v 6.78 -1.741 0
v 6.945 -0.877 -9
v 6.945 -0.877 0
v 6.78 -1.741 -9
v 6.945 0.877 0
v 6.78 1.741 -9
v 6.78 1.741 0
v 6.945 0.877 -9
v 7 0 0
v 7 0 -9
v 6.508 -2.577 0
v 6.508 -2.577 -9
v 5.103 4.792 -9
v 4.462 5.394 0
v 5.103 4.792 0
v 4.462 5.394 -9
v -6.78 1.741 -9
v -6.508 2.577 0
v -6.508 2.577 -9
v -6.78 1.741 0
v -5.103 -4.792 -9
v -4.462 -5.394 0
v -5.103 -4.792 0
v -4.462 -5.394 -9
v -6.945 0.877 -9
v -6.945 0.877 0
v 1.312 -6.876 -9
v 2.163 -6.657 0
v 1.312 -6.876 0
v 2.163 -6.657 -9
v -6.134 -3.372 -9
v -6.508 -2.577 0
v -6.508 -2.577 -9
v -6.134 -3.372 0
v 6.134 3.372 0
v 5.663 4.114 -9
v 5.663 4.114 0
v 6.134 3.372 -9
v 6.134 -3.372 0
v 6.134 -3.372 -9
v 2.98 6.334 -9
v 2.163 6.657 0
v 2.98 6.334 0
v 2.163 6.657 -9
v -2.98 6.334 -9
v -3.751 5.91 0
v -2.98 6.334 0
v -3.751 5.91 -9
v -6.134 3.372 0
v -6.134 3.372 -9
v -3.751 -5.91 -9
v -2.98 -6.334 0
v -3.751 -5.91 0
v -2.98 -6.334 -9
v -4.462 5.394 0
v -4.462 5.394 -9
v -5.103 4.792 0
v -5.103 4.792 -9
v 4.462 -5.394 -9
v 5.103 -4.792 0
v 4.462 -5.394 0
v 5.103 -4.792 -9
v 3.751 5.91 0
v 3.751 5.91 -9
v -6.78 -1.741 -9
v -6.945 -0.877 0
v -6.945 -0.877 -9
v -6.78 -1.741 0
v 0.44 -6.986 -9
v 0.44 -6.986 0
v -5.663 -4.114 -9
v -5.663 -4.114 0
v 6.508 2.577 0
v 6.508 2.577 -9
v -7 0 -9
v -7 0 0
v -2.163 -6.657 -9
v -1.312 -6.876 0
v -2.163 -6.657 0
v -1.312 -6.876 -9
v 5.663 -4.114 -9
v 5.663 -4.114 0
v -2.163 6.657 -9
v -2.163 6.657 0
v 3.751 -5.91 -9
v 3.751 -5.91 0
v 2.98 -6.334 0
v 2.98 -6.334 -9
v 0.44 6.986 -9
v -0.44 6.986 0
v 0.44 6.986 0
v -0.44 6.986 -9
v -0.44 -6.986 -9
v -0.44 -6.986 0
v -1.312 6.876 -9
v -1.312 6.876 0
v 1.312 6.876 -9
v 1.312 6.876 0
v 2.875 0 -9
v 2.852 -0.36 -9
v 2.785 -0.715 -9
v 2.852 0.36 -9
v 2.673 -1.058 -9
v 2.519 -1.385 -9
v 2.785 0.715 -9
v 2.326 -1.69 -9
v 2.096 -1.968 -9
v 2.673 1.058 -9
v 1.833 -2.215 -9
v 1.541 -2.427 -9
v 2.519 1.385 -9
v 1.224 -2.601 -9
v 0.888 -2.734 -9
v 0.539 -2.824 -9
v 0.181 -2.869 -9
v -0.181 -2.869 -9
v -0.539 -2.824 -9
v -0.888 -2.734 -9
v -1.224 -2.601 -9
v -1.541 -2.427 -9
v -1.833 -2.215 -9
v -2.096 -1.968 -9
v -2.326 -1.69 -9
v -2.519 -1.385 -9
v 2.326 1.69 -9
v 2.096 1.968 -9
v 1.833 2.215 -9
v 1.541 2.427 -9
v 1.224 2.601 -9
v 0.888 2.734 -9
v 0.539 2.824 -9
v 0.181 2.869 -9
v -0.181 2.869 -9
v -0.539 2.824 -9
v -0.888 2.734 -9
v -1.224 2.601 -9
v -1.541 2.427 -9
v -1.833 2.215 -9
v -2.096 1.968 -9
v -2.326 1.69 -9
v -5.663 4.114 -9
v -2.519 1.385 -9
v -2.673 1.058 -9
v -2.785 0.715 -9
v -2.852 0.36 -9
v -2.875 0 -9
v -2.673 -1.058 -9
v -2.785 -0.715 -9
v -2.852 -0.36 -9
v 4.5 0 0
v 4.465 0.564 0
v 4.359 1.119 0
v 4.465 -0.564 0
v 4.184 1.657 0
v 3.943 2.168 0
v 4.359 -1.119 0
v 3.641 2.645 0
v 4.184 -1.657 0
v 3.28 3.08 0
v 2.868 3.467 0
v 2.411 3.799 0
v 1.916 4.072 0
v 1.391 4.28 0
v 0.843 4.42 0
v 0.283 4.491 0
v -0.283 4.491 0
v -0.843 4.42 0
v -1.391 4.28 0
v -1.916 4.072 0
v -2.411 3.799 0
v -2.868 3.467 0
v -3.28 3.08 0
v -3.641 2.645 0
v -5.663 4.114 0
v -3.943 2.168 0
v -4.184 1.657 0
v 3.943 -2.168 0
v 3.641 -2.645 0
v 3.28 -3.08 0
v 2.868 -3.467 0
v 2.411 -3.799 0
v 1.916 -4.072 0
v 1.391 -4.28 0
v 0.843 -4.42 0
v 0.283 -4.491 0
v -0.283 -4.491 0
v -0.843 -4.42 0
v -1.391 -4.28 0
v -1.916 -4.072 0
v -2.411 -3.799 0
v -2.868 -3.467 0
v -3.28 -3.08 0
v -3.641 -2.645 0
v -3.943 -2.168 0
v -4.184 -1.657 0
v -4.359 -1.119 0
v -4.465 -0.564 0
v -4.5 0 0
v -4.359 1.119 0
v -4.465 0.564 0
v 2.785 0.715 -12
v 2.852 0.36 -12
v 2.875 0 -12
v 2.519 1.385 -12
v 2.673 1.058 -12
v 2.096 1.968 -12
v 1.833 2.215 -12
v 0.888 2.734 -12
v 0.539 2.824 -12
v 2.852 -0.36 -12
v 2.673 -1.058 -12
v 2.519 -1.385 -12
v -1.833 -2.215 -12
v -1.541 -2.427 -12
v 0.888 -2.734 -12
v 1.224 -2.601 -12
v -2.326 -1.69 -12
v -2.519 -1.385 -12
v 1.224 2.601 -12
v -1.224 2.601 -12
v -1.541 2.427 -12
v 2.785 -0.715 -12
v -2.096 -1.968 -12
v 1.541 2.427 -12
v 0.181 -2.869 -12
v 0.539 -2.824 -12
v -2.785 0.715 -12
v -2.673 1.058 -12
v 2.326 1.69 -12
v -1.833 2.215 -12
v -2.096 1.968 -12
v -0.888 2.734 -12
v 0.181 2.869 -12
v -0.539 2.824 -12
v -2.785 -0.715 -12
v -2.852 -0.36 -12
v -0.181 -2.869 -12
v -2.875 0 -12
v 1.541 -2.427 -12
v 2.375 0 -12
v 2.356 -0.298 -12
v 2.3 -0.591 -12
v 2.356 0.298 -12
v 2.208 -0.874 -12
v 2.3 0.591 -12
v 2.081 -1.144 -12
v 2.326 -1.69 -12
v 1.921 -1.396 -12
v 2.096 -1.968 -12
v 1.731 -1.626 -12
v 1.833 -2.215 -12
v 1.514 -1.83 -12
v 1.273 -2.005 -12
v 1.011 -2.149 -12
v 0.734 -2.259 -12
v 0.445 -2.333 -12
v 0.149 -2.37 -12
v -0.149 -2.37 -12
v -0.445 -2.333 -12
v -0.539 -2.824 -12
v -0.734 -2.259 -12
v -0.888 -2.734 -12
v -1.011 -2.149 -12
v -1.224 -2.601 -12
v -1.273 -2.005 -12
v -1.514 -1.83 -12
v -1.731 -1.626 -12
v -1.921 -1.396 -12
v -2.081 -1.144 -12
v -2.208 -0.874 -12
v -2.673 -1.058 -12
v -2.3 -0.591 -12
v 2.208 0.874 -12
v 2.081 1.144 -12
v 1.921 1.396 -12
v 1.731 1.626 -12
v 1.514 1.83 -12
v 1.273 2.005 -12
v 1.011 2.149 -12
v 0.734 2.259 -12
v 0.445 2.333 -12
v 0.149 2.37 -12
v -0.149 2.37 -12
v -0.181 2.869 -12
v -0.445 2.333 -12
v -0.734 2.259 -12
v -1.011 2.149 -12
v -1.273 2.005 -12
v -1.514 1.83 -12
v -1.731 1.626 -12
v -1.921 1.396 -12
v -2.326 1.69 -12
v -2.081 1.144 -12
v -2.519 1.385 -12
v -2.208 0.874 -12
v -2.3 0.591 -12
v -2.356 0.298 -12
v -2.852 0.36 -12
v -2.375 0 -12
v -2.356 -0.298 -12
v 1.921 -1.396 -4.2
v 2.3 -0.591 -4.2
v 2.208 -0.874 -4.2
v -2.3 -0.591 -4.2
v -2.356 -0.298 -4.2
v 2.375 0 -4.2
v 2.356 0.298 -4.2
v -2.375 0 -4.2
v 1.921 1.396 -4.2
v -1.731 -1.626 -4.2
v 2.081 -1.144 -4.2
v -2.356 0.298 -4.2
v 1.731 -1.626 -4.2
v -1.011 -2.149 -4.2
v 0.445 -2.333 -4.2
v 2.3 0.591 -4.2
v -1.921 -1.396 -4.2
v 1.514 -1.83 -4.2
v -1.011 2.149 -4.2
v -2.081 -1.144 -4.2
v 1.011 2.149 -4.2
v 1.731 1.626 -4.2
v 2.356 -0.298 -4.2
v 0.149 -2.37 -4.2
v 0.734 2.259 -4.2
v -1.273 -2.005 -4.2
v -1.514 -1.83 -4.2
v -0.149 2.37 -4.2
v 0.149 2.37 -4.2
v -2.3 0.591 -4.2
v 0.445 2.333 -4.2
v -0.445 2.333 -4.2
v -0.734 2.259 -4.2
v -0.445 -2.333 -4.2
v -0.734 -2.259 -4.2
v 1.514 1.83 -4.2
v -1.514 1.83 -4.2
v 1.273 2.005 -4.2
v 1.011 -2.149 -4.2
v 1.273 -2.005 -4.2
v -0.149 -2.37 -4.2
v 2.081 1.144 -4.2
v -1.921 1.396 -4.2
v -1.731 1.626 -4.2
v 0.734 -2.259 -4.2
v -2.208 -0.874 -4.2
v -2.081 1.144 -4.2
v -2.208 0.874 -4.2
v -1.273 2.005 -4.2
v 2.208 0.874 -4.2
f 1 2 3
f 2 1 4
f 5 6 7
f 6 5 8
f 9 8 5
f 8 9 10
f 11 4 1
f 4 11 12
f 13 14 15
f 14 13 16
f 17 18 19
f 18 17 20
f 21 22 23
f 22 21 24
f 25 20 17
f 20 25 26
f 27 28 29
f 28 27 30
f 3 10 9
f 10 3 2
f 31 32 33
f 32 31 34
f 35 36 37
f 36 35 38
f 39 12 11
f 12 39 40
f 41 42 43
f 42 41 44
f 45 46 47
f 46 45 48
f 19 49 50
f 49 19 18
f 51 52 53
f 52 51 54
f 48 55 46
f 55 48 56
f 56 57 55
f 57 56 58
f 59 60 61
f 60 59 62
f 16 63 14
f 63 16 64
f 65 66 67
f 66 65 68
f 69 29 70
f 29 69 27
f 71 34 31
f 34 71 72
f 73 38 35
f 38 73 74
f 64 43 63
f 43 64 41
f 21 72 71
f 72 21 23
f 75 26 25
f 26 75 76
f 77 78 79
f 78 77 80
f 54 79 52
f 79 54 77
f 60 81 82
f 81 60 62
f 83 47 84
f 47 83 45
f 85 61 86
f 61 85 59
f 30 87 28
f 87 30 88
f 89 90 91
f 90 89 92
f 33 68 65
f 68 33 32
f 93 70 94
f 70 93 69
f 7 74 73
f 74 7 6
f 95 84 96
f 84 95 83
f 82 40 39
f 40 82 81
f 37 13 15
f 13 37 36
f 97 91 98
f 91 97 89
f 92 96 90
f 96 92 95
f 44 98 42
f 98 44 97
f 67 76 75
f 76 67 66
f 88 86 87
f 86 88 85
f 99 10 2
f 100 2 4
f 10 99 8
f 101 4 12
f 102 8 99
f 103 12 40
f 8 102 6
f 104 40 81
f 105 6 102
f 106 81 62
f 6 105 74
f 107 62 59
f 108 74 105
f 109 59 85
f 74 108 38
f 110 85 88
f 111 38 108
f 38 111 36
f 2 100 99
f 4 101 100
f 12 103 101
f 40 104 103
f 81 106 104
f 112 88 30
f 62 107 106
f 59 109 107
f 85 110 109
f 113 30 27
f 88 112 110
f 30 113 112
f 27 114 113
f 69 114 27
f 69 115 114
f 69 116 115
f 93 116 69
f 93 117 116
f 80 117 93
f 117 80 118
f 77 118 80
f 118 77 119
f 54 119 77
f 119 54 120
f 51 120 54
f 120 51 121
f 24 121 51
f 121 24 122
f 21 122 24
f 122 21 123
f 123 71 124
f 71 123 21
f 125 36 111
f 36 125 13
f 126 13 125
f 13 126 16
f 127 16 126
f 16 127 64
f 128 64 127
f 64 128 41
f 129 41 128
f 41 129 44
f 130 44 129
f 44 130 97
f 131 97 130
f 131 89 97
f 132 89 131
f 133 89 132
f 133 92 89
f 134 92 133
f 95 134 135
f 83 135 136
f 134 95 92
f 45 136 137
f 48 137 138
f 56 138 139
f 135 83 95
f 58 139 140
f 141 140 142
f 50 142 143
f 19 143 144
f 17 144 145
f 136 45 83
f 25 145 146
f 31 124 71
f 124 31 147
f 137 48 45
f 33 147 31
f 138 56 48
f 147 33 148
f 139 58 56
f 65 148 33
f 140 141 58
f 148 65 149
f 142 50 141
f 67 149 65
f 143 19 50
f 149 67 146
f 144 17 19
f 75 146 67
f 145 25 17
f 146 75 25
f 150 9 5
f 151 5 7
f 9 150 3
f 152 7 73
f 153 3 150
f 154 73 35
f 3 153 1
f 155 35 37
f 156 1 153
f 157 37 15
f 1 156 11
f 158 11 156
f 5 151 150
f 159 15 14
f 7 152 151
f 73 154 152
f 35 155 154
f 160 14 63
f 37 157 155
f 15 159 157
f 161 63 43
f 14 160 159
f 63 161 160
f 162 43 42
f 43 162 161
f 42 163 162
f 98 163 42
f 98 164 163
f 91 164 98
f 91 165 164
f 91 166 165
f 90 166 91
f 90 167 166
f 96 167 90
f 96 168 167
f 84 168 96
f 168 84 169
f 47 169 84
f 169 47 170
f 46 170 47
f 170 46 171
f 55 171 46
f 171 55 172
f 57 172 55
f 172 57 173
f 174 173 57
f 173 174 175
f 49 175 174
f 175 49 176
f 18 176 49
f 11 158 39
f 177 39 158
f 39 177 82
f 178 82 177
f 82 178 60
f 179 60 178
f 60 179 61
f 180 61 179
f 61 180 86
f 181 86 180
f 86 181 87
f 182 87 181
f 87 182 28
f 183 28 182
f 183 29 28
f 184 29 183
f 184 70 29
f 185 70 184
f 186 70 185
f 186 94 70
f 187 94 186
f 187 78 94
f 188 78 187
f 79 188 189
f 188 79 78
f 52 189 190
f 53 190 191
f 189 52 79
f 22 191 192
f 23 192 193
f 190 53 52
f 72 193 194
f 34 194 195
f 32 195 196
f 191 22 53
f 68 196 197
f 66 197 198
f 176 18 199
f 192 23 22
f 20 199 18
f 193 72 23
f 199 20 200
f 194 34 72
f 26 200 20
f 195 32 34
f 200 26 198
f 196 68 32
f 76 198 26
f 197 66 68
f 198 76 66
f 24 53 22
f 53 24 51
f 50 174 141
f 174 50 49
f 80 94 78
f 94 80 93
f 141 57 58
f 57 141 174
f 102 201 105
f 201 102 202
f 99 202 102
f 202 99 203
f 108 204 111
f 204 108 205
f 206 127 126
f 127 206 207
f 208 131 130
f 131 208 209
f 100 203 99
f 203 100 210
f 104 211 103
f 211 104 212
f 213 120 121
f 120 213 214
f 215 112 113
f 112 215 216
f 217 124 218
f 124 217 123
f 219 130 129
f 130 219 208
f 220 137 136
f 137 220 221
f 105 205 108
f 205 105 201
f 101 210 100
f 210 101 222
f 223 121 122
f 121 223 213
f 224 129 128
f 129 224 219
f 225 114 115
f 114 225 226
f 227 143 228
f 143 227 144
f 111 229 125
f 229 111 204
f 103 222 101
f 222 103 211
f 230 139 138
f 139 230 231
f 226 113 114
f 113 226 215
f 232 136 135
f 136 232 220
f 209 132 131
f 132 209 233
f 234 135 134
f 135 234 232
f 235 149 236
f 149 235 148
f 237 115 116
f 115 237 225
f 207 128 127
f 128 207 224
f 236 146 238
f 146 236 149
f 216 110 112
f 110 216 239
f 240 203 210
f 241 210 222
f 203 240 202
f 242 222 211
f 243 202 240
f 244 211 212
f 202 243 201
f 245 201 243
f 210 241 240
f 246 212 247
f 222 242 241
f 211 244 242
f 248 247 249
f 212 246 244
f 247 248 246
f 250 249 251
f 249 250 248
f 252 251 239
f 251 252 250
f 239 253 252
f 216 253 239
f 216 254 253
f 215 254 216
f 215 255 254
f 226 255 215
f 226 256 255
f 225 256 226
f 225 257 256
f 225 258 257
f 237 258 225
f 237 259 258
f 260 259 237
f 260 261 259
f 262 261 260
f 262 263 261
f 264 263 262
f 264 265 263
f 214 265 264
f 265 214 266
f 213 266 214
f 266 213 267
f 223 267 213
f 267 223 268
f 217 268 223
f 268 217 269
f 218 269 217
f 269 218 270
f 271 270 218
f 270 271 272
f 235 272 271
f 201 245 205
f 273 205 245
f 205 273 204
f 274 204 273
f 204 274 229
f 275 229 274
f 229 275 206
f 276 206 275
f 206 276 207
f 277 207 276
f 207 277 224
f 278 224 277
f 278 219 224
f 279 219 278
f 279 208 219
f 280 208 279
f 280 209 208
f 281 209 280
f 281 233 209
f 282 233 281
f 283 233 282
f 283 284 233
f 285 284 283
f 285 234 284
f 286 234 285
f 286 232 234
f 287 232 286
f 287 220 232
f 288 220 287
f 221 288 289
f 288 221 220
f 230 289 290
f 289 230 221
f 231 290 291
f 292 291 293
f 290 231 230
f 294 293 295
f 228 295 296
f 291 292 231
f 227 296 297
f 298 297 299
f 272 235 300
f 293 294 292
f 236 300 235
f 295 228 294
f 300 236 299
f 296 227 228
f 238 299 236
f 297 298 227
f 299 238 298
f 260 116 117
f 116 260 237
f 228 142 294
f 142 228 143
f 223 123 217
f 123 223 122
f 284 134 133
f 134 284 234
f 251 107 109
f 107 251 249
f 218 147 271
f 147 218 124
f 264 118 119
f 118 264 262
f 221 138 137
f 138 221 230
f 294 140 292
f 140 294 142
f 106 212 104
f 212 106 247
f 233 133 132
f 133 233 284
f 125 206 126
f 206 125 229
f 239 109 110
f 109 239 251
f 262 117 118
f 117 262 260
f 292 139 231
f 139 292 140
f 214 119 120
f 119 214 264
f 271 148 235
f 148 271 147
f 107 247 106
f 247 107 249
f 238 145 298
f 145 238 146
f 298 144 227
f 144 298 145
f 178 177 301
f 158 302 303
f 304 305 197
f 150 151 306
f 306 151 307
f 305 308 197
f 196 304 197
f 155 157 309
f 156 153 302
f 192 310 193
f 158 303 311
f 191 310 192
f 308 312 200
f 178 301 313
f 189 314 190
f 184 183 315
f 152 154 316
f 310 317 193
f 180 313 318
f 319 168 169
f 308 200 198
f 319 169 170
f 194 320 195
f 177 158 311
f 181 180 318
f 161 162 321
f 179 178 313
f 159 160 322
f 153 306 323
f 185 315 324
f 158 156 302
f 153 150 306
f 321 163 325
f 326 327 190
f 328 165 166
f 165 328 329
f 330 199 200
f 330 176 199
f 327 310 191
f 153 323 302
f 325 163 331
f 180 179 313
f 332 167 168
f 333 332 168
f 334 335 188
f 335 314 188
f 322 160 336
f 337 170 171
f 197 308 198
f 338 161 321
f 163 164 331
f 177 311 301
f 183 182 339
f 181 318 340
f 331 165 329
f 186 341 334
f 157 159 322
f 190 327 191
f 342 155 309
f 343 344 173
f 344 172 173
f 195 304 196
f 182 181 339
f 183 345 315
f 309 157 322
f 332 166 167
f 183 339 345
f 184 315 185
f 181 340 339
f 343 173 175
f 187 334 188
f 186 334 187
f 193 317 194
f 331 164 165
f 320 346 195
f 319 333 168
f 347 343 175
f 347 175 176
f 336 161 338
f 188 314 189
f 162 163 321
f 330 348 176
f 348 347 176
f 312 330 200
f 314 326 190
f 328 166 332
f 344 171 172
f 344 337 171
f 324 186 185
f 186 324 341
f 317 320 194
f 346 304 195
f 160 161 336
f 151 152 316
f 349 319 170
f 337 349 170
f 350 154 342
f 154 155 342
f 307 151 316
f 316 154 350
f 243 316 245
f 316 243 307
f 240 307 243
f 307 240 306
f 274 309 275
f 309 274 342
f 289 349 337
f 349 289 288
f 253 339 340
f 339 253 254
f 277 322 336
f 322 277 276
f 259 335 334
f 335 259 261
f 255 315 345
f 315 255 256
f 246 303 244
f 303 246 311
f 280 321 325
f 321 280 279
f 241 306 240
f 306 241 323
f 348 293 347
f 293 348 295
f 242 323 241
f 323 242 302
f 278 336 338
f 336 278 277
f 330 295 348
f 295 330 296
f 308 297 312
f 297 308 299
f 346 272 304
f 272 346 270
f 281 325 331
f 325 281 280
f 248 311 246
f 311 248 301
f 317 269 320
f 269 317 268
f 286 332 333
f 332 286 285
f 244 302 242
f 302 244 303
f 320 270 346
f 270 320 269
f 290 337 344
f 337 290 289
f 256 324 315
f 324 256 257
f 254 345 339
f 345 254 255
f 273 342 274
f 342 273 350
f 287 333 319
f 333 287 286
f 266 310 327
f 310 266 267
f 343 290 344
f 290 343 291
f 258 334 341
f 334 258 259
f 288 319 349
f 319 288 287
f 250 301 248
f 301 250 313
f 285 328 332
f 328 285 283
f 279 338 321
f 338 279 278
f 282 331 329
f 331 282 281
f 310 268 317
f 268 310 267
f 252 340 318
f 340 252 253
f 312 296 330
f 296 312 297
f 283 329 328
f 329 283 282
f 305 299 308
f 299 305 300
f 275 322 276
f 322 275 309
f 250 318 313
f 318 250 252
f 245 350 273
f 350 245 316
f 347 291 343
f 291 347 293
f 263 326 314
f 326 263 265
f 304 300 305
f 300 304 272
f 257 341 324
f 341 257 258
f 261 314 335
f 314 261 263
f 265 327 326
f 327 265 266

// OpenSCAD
$fn = 50;


difference() {
	union() {
		translate(v = [0, 0, -9.0000000000]) {
			cylinder(h = 9, r = 7.0000000000);
		}
		#translate(v = [0, 0, -12.0000000000]) {
			cylinder(h = 12, r = 2.8750000000);
		}
	}
	union() {
		translate(v = [0, 0, 0]) {
			rotate(a = [0, 0, 0]) {
				difference() {
					union() {
						translate(v = [0, 0, -12.0000000000]) {
							cylinder(h = 12, r = 2.2500000000);
						}
						translate(v = [0, 0, -4.2000000000]) {
							cylinder(h = 4.2000000000, r1 = 2.3750000000, r2 = 4.5000000000);
						}
						translate(v = [0, 0, -12.0000000000]) {
							cylinder(h = 12, r = 2.3750000000);
						}
						translate(v = [0, 0, -12.0000000000]) {
							cylinder(h = 12, r = 2.2500000000);
						}
					}
					union();
				}
			}
		}
	}
}
